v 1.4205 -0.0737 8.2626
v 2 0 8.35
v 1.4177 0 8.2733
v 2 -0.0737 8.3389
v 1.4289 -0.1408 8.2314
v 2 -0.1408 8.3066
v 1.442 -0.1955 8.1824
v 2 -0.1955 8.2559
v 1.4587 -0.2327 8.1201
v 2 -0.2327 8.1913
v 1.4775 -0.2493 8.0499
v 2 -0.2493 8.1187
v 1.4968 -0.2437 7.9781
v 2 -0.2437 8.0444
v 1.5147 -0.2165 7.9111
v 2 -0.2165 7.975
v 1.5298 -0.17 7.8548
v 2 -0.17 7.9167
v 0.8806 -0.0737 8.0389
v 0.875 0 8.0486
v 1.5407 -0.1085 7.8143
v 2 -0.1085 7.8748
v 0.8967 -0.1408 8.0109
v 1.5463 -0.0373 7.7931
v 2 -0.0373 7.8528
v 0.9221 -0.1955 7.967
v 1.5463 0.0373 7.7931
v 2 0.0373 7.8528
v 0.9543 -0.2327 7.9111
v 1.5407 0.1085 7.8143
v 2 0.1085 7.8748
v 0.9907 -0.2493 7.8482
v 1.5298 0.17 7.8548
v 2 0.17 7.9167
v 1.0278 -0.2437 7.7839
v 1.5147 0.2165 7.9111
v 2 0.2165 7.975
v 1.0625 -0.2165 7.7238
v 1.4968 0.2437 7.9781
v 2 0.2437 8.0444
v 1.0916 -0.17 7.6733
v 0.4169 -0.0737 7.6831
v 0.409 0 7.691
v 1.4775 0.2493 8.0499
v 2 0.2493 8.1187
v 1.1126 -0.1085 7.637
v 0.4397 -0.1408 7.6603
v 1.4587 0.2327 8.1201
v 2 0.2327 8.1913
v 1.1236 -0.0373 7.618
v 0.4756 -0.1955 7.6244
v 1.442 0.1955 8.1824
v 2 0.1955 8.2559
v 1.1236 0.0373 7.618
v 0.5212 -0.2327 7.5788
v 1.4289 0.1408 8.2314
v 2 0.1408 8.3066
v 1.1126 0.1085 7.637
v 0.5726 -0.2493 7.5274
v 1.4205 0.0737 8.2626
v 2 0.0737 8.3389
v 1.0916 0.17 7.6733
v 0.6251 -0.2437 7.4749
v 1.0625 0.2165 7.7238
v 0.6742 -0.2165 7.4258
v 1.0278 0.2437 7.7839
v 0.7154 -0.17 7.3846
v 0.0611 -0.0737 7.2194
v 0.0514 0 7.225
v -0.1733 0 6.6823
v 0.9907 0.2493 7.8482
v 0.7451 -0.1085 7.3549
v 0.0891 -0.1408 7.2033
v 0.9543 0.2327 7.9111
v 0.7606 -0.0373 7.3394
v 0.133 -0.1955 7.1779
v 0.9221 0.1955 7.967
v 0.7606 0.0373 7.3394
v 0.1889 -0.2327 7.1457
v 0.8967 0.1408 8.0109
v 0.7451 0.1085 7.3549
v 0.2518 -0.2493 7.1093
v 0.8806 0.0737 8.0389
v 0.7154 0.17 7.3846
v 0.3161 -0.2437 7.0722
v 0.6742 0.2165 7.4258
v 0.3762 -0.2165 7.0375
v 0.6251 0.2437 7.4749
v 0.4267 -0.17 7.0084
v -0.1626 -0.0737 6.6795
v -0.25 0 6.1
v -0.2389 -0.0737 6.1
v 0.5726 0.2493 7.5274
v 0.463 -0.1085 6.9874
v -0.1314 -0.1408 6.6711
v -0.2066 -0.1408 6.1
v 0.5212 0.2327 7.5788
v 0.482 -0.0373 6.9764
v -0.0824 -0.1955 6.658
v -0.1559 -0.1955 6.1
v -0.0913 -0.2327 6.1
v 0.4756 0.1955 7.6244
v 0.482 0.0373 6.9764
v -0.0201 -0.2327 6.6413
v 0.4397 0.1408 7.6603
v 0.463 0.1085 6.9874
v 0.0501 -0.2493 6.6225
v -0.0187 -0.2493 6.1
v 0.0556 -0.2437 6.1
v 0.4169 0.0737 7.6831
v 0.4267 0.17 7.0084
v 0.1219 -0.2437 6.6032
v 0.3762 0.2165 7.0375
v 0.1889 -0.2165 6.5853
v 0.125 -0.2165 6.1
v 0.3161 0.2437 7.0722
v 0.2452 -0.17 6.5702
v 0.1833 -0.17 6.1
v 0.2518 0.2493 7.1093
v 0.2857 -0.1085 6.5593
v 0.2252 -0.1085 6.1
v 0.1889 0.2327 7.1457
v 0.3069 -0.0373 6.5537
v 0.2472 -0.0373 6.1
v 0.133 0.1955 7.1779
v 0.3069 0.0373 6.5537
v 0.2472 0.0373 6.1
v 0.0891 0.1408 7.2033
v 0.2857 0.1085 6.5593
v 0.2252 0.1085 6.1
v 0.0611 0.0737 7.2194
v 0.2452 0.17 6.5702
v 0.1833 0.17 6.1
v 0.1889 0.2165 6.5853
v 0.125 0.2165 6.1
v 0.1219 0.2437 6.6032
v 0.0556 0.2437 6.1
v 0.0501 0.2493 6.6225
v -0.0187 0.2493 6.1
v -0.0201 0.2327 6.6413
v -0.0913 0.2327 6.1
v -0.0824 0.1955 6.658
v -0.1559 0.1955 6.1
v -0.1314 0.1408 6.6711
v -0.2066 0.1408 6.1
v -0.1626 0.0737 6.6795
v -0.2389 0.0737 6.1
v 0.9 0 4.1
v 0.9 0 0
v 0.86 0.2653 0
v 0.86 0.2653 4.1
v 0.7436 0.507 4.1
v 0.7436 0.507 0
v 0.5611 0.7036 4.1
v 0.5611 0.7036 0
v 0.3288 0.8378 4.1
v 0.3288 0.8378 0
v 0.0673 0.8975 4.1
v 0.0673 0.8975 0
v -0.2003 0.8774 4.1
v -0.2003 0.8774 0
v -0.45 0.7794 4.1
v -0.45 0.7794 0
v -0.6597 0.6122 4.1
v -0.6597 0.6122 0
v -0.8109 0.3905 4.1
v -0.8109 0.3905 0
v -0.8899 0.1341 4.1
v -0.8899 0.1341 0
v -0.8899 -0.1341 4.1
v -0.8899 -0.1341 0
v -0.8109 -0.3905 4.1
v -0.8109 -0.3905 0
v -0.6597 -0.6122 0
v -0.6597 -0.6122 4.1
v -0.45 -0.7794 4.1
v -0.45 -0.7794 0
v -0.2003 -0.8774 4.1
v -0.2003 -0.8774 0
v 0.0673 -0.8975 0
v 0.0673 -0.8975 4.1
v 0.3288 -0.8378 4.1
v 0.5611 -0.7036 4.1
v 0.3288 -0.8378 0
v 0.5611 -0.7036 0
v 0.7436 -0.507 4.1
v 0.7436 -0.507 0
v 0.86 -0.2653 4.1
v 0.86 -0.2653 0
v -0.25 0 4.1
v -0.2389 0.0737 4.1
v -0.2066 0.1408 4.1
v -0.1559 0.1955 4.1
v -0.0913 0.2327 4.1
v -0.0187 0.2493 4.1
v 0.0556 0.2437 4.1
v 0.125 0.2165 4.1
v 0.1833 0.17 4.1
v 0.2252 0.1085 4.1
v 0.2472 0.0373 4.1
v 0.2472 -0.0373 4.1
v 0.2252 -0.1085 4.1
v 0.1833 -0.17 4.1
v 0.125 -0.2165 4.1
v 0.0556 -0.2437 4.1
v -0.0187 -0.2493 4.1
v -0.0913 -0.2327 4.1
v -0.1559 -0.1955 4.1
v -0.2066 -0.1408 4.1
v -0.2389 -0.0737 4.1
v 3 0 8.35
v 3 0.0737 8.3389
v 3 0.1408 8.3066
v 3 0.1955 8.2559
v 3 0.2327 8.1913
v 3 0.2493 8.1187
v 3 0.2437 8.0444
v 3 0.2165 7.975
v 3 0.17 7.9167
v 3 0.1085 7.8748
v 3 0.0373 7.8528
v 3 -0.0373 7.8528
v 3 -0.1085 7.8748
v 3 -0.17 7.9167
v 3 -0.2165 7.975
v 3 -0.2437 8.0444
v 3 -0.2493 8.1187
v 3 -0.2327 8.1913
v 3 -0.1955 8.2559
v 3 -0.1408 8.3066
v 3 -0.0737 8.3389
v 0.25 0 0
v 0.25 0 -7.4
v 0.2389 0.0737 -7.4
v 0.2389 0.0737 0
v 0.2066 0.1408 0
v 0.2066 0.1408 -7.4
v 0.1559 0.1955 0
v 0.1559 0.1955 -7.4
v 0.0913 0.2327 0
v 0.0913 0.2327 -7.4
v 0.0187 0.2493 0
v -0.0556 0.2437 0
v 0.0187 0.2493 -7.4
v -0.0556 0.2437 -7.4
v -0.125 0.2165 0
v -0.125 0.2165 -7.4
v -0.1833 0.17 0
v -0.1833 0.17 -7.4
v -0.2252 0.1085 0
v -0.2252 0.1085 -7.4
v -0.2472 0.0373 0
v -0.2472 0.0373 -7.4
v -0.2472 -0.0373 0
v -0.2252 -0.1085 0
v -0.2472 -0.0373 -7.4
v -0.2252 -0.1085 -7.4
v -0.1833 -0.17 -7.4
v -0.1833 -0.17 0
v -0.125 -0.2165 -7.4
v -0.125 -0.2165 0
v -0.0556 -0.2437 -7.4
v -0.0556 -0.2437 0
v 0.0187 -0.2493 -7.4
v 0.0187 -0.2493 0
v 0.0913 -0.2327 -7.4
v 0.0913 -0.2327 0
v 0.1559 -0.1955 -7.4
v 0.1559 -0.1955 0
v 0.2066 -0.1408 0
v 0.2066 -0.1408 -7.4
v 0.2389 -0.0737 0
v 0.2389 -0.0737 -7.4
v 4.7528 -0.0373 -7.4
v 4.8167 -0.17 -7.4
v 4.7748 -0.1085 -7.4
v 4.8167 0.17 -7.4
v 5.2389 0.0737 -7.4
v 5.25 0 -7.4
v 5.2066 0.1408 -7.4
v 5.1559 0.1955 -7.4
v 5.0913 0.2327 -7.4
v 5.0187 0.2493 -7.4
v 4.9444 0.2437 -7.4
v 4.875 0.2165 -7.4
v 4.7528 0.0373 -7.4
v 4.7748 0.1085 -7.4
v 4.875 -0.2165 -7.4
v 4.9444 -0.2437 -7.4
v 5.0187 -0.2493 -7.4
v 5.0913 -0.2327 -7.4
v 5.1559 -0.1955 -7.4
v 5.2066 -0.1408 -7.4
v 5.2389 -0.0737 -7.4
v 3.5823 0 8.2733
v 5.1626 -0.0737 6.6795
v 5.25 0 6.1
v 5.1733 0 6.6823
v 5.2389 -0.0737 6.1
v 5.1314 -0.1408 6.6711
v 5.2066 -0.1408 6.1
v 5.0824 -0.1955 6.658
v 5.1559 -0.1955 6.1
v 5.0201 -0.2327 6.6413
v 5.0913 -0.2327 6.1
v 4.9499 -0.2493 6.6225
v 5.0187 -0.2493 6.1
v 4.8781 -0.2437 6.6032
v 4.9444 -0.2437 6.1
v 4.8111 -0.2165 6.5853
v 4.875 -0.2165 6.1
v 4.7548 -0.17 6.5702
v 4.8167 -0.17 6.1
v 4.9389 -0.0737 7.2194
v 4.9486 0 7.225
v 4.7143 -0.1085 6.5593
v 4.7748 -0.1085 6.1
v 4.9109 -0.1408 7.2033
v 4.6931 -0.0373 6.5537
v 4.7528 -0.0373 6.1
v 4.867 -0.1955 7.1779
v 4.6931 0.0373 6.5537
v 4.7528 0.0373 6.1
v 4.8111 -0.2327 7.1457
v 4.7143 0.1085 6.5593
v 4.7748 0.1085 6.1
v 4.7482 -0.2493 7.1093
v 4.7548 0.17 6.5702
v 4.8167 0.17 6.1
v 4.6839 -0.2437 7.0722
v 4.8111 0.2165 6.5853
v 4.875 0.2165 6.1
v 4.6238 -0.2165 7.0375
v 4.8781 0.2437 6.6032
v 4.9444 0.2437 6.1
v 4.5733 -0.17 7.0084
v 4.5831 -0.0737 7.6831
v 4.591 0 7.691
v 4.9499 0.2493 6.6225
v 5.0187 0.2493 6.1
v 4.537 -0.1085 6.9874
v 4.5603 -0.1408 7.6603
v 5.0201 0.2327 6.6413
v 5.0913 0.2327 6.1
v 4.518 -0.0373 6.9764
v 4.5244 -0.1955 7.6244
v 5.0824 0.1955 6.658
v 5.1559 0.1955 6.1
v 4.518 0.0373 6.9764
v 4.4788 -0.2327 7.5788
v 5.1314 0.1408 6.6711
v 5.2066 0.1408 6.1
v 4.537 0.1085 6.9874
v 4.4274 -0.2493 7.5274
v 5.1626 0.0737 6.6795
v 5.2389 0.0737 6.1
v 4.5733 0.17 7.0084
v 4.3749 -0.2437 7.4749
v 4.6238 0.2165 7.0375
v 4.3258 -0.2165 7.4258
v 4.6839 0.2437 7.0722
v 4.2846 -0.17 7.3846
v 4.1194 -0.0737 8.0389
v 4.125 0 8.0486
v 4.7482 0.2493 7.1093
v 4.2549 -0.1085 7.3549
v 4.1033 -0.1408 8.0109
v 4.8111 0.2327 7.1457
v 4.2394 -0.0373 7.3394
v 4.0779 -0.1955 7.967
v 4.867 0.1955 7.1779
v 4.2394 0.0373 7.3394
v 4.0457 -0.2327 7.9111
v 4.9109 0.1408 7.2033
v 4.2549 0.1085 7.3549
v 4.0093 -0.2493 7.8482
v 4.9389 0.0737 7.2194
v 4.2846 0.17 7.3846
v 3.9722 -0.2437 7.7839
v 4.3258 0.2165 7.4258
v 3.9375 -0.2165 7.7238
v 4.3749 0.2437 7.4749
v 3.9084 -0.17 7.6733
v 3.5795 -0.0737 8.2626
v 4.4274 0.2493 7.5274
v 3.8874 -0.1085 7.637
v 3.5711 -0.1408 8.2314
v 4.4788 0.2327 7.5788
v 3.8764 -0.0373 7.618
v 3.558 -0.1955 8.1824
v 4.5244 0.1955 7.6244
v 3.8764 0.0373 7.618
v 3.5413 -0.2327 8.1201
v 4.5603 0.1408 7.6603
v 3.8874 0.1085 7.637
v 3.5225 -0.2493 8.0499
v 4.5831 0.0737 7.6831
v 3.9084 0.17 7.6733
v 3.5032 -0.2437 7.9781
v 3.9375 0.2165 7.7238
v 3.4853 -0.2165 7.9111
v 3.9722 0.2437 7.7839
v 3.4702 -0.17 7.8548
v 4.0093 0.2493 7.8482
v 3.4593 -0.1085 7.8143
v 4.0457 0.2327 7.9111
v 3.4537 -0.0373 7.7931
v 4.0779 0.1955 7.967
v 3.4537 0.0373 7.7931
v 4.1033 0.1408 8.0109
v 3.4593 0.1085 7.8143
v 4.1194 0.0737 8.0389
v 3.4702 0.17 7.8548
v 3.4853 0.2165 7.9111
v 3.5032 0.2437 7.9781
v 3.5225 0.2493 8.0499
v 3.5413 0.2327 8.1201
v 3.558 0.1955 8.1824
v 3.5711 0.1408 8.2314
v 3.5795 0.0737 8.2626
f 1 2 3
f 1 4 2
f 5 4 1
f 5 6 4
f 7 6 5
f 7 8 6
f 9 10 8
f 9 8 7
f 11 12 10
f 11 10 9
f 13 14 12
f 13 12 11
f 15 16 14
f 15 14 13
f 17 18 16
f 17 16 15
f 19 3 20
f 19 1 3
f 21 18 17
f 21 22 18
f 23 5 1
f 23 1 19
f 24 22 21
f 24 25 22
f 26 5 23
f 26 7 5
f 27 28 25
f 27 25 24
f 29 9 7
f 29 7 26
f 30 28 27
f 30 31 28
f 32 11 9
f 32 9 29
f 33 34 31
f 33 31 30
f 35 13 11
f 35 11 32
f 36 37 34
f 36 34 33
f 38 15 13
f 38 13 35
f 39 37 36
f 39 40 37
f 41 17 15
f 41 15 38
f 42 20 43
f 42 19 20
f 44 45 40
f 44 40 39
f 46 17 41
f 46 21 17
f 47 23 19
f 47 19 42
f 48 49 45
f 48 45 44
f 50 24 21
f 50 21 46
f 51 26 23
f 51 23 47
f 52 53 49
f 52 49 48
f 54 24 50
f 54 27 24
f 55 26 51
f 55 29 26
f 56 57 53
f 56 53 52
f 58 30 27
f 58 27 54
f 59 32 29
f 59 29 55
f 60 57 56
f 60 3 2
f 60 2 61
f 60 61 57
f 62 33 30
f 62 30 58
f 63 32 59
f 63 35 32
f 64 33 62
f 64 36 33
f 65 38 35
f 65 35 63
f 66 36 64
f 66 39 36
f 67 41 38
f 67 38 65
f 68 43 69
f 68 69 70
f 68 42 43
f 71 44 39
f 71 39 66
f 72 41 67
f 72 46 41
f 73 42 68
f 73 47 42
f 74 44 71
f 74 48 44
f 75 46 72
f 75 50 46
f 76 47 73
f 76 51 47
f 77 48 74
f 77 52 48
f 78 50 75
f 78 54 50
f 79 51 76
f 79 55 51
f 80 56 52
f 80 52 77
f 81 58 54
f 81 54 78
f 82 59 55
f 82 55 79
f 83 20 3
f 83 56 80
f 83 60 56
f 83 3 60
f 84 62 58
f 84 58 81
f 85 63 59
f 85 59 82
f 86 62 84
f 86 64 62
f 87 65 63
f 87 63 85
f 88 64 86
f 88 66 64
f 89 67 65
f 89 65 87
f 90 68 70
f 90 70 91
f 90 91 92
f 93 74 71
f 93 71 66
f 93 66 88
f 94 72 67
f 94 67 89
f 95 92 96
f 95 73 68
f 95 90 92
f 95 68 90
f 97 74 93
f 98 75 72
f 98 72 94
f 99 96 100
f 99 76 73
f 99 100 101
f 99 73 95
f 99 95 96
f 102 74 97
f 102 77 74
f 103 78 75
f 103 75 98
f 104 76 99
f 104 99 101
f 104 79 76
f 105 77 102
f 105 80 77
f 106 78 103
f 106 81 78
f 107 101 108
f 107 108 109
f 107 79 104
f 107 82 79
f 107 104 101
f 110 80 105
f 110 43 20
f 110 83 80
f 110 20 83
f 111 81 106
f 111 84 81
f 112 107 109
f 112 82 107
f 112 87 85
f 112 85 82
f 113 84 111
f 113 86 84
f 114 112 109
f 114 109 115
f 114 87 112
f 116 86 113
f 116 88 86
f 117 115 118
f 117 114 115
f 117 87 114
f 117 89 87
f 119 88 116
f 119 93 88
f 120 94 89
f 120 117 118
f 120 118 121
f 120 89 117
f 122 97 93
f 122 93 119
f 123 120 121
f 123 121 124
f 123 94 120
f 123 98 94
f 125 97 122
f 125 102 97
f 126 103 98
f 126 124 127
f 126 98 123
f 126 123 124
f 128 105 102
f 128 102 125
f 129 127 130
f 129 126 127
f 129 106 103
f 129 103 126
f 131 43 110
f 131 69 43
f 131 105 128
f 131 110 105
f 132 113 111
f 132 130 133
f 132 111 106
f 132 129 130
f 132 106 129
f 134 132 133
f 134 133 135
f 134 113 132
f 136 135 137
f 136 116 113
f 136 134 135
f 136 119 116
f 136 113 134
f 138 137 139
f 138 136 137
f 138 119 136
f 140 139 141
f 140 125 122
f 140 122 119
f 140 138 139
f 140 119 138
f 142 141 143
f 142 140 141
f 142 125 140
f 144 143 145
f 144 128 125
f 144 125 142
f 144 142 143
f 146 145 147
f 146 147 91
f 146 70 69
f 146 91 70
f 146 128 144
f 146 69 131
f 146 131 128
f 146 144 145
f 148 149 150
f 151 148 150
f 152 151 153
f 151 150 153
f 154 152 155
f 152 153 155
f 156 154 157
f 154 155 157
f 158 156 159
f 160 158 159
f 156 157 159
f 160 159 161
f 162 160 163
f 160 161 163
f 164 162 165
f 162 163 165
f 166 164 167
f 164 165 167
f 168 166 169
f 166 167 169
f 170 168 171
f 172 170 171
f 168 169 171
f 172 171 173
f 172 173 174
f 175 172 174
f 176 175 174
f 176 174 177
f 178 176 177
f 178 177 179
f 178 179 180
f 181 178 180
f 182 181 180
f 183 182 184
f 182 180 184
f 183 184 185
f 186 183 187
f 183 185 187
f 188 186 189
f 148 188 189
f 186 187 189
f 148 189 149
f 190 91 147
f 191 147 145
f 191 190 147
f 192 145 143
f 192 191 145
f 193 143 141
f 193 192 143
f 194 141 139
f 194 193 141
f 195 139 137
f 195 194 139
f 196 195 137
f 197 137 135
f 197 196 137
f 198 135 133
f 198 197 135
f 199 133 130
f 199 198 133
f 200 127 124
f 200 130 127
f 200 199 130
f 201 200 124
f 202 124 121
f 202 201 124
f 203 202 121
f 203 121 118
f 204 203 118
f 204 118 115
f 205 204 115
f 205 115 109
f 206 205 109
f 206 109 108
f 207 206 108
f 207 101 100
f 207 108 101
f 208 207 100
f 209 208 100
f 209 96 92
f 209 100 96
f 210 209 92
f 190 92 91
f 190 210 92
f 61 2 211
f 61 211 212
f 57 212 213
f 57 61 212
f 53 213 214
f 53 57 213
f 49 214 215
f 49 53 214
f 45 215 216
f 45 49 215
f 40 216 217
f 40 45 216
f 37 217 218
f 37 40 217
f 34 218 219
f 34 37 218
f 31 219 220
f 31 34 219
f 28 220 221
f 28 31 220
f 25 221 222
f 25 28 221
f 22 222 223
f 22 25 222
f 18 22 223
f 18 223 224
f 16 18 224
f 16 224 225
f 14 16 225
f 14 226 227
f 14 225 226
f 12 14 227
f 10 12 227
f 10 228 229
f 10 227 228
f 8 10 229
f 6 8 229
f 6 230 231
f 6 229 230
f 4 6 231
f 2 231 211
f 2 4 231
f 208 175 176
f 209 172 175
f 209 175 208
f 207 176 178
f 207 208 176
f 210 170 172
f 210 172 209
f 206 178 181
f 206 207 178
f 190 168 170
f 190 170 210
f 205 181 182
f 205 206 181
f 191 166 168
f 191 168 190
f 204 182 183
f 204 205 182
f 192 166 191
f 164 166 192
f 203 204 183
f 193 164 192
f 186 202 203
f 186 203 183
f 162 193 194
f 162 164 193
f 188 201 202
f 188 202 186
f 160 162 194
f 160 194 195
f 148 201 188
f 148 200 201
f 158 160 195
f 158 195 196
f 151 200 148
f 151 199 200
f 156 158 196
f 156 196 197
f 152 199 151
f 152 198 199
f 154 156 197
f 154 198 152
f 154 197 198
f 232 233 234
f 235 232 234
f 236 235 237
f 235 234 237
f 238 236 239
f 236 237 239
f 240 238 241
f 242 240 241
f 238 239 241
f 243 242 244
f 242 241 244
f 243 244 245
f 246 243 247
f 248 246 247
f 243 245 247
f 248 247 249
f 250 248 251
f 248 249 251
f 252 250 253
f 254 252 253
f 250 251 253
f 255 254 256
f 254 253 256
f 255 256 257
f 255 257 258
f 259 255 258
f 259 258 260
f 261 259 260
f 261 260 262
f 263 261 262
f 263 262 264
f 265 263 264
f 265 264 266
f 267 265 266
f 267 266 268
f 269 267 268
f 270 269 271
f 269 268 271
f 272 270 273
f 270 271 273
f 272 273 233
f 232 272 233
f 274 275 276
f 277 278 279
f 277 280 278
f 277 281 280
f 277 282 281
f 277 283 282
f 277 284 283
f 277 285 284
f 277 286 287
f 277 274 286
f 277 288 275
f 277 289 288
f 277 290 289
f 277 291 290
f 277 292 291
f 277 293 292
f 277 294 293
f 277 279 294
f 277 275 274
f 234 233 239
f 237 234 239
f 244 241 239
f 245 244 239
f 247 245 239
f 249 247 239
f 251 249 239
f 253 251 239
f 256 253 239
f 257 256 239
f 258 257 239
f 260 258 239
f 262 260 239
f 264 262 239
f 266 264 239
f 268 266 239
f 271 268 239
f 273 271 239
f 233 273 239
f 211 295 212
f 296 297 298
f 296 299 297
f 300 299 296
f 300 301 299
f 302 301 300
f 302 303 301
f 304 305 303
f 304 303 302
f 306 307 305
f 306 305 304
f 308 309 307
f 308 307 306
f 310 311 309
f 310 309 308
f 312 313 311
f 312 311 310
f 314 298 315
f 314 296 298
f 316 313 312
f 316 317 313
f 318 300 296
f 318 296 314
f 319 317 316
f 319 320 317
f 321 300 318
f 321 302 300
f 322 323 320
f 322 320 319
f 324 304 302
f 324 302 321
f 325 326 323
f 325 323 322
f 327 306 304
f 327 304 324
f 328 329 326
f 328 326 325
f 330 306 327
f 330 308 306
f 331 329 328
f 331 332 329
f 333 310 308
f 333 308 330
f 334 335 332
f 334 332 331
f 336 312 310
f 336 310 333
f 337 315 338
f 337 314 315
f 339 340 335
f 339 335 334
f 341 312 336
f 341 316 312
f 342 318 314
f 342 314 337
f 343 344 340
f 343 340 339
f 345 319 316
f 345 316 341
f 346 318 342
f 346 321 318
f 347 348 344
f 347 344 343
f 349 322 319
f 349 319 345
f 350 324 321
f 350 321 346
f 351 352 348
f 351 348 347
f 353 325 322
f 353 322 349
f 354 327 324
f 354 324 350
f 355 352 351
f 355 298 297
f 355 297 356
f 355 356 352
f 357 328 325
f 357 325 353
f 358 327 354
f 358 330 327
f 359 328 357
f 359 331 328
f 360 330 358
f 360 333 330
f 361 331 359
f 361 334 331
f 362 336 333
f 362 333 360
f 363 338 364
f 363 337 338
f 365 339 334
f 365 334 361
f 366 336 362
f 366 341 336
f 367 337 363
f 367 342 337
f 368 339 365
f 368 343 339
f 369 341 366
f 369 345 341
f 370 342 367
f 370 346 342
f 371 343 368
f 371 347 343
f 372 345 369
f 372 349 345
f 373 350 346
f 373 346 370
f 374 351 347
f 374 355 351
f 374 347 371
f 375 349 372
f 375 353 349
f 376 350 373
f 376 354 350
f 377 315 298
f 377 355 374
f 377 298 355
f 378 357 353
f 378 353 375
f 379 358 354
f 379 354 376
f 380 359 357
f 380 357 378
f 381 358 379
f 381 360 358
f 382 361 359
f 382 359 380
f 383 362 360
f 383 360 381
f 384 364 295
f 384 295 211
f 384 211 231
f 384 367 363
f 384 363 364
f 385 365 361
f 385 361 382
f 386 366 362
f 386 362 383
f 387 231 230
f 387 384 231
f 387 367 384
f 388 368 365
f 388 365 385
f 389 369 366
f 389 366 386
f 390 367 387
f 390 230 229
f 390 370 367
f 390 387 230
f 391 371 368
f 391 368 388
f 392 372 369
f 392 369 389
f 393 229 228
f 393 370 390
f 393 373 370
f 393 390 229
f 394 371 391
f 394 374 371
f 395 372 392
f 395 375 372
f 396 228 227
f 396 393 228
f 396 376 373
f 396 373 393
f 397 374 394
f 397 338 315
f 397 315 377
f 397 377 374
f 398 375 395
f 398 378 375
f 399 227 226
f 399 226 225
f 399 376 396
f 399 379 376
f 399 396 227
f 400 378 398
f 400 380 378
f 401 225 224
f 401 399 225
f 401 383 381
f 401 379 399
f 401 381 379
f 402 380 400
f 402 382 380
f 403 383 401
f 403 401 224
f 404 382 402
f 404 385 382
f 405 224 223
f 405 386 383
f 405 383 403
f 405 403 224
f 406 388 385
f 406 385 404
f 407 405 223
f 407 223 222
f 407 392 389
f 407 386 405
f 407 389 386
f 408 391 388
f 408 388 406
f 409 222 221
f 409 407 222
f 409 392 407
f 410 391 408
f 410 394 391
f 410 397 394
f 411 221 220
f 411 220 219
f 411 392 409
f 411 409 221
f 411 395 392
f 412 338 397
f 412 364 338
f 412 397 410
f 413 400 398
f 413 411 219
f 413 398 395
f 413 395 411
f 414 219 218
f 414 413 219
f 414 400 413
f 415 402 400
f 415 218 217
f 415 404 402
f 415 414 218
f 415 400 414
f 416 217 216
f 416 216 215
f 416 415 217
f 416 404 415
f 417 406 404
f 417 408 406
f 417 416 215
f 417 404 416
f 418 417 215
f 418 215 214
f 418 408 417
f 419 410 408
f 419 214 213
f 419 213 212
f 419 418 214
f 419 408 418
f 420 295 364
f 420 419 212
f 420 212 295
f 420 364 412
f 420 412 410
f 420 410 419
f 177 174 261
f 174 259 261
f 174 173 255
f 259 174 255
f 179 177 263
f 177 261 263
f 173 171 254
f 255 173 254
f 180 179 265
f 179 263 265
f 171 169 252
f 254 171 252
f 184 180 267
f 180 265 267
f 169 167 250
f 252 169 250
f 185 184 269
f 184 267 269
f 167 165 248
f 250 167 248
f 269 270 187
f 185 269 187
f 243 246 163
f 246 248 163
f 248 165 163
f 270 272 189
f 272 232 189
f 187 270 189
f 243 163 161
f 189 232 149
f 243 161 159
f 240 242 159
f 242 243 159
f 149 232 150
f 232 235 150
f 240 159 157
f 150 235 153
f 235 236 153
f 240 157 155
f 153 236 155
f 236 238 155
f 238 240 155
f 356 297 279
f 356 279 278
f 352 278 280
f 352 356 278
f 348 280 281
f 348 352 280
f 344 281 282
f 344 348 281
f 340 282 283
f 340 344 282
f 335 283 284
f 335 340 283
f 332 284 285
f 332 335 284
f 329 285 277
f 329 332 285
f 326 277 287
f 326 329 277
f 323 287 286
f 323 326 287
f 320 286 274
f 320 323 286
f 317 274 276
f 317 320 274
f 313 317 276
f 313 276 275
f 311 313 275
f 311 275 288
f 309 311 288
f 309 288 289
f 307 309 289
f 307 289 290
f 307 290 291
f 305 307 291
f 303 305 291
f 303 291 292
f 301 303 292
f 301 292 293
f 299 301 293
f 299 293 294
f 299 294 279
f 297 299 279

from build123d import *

# Parameters (mm, degrees)
SKETCH2_R           = 0.9
RESISTOR_BODY_DEPTH = 4.1
LEAD1_PROFILE_R     = 0.25
LEAD2_START         = -7.4
SKETCH6_R           = 0.25
LEAD2_DEPTH         = 7.4


with BuildPart() as part:
    # Sketch2 → Resistor Body (new body)
    with BuildSketch(Plane.XY):
        Circle(SKETCH2_R)
    extrude(amount=RESISTOR_BODY_DEPTH)

    # Lead1: sweep along a path in Lead1 Path
    with BuildLine(Plane(origin=(0, 0, 0), x_dir=(1, 0, 0), z_dir=(0, 1, 0))) as lead1_path:
        Line((5, 7.4), (5, -6.1))
        ThreePointArc((5, -6.1), (4.414213562, -7.514213562), (3, -8.1))
        Line((3, -8.1), (2, -8.1))
        ThreePointArc((2, -8.1), (0.585786438, -7.514213562), (0, -6.1))
        Line((0, -6.1), (0, -4.1))
    # Lead1 Profile → Lead1 (sweep)
    with BuildSketch(Plane(origin=(0, 0, 4.1), x_dir=(-1, 0, 0), z_dir=(0, 0, 1))):
        Circle(LEAD1_PROFILE_R)
    sweep(path=lead1_path.line)

    # Sketch6 → Lead2 (add)
    with BuildSketch(Plane.XY.offset(LEAD2_START)):
        Circle(SKETCH6_R)
    extrude(amount=LEAD2_DEPTH)


solid = part.part
